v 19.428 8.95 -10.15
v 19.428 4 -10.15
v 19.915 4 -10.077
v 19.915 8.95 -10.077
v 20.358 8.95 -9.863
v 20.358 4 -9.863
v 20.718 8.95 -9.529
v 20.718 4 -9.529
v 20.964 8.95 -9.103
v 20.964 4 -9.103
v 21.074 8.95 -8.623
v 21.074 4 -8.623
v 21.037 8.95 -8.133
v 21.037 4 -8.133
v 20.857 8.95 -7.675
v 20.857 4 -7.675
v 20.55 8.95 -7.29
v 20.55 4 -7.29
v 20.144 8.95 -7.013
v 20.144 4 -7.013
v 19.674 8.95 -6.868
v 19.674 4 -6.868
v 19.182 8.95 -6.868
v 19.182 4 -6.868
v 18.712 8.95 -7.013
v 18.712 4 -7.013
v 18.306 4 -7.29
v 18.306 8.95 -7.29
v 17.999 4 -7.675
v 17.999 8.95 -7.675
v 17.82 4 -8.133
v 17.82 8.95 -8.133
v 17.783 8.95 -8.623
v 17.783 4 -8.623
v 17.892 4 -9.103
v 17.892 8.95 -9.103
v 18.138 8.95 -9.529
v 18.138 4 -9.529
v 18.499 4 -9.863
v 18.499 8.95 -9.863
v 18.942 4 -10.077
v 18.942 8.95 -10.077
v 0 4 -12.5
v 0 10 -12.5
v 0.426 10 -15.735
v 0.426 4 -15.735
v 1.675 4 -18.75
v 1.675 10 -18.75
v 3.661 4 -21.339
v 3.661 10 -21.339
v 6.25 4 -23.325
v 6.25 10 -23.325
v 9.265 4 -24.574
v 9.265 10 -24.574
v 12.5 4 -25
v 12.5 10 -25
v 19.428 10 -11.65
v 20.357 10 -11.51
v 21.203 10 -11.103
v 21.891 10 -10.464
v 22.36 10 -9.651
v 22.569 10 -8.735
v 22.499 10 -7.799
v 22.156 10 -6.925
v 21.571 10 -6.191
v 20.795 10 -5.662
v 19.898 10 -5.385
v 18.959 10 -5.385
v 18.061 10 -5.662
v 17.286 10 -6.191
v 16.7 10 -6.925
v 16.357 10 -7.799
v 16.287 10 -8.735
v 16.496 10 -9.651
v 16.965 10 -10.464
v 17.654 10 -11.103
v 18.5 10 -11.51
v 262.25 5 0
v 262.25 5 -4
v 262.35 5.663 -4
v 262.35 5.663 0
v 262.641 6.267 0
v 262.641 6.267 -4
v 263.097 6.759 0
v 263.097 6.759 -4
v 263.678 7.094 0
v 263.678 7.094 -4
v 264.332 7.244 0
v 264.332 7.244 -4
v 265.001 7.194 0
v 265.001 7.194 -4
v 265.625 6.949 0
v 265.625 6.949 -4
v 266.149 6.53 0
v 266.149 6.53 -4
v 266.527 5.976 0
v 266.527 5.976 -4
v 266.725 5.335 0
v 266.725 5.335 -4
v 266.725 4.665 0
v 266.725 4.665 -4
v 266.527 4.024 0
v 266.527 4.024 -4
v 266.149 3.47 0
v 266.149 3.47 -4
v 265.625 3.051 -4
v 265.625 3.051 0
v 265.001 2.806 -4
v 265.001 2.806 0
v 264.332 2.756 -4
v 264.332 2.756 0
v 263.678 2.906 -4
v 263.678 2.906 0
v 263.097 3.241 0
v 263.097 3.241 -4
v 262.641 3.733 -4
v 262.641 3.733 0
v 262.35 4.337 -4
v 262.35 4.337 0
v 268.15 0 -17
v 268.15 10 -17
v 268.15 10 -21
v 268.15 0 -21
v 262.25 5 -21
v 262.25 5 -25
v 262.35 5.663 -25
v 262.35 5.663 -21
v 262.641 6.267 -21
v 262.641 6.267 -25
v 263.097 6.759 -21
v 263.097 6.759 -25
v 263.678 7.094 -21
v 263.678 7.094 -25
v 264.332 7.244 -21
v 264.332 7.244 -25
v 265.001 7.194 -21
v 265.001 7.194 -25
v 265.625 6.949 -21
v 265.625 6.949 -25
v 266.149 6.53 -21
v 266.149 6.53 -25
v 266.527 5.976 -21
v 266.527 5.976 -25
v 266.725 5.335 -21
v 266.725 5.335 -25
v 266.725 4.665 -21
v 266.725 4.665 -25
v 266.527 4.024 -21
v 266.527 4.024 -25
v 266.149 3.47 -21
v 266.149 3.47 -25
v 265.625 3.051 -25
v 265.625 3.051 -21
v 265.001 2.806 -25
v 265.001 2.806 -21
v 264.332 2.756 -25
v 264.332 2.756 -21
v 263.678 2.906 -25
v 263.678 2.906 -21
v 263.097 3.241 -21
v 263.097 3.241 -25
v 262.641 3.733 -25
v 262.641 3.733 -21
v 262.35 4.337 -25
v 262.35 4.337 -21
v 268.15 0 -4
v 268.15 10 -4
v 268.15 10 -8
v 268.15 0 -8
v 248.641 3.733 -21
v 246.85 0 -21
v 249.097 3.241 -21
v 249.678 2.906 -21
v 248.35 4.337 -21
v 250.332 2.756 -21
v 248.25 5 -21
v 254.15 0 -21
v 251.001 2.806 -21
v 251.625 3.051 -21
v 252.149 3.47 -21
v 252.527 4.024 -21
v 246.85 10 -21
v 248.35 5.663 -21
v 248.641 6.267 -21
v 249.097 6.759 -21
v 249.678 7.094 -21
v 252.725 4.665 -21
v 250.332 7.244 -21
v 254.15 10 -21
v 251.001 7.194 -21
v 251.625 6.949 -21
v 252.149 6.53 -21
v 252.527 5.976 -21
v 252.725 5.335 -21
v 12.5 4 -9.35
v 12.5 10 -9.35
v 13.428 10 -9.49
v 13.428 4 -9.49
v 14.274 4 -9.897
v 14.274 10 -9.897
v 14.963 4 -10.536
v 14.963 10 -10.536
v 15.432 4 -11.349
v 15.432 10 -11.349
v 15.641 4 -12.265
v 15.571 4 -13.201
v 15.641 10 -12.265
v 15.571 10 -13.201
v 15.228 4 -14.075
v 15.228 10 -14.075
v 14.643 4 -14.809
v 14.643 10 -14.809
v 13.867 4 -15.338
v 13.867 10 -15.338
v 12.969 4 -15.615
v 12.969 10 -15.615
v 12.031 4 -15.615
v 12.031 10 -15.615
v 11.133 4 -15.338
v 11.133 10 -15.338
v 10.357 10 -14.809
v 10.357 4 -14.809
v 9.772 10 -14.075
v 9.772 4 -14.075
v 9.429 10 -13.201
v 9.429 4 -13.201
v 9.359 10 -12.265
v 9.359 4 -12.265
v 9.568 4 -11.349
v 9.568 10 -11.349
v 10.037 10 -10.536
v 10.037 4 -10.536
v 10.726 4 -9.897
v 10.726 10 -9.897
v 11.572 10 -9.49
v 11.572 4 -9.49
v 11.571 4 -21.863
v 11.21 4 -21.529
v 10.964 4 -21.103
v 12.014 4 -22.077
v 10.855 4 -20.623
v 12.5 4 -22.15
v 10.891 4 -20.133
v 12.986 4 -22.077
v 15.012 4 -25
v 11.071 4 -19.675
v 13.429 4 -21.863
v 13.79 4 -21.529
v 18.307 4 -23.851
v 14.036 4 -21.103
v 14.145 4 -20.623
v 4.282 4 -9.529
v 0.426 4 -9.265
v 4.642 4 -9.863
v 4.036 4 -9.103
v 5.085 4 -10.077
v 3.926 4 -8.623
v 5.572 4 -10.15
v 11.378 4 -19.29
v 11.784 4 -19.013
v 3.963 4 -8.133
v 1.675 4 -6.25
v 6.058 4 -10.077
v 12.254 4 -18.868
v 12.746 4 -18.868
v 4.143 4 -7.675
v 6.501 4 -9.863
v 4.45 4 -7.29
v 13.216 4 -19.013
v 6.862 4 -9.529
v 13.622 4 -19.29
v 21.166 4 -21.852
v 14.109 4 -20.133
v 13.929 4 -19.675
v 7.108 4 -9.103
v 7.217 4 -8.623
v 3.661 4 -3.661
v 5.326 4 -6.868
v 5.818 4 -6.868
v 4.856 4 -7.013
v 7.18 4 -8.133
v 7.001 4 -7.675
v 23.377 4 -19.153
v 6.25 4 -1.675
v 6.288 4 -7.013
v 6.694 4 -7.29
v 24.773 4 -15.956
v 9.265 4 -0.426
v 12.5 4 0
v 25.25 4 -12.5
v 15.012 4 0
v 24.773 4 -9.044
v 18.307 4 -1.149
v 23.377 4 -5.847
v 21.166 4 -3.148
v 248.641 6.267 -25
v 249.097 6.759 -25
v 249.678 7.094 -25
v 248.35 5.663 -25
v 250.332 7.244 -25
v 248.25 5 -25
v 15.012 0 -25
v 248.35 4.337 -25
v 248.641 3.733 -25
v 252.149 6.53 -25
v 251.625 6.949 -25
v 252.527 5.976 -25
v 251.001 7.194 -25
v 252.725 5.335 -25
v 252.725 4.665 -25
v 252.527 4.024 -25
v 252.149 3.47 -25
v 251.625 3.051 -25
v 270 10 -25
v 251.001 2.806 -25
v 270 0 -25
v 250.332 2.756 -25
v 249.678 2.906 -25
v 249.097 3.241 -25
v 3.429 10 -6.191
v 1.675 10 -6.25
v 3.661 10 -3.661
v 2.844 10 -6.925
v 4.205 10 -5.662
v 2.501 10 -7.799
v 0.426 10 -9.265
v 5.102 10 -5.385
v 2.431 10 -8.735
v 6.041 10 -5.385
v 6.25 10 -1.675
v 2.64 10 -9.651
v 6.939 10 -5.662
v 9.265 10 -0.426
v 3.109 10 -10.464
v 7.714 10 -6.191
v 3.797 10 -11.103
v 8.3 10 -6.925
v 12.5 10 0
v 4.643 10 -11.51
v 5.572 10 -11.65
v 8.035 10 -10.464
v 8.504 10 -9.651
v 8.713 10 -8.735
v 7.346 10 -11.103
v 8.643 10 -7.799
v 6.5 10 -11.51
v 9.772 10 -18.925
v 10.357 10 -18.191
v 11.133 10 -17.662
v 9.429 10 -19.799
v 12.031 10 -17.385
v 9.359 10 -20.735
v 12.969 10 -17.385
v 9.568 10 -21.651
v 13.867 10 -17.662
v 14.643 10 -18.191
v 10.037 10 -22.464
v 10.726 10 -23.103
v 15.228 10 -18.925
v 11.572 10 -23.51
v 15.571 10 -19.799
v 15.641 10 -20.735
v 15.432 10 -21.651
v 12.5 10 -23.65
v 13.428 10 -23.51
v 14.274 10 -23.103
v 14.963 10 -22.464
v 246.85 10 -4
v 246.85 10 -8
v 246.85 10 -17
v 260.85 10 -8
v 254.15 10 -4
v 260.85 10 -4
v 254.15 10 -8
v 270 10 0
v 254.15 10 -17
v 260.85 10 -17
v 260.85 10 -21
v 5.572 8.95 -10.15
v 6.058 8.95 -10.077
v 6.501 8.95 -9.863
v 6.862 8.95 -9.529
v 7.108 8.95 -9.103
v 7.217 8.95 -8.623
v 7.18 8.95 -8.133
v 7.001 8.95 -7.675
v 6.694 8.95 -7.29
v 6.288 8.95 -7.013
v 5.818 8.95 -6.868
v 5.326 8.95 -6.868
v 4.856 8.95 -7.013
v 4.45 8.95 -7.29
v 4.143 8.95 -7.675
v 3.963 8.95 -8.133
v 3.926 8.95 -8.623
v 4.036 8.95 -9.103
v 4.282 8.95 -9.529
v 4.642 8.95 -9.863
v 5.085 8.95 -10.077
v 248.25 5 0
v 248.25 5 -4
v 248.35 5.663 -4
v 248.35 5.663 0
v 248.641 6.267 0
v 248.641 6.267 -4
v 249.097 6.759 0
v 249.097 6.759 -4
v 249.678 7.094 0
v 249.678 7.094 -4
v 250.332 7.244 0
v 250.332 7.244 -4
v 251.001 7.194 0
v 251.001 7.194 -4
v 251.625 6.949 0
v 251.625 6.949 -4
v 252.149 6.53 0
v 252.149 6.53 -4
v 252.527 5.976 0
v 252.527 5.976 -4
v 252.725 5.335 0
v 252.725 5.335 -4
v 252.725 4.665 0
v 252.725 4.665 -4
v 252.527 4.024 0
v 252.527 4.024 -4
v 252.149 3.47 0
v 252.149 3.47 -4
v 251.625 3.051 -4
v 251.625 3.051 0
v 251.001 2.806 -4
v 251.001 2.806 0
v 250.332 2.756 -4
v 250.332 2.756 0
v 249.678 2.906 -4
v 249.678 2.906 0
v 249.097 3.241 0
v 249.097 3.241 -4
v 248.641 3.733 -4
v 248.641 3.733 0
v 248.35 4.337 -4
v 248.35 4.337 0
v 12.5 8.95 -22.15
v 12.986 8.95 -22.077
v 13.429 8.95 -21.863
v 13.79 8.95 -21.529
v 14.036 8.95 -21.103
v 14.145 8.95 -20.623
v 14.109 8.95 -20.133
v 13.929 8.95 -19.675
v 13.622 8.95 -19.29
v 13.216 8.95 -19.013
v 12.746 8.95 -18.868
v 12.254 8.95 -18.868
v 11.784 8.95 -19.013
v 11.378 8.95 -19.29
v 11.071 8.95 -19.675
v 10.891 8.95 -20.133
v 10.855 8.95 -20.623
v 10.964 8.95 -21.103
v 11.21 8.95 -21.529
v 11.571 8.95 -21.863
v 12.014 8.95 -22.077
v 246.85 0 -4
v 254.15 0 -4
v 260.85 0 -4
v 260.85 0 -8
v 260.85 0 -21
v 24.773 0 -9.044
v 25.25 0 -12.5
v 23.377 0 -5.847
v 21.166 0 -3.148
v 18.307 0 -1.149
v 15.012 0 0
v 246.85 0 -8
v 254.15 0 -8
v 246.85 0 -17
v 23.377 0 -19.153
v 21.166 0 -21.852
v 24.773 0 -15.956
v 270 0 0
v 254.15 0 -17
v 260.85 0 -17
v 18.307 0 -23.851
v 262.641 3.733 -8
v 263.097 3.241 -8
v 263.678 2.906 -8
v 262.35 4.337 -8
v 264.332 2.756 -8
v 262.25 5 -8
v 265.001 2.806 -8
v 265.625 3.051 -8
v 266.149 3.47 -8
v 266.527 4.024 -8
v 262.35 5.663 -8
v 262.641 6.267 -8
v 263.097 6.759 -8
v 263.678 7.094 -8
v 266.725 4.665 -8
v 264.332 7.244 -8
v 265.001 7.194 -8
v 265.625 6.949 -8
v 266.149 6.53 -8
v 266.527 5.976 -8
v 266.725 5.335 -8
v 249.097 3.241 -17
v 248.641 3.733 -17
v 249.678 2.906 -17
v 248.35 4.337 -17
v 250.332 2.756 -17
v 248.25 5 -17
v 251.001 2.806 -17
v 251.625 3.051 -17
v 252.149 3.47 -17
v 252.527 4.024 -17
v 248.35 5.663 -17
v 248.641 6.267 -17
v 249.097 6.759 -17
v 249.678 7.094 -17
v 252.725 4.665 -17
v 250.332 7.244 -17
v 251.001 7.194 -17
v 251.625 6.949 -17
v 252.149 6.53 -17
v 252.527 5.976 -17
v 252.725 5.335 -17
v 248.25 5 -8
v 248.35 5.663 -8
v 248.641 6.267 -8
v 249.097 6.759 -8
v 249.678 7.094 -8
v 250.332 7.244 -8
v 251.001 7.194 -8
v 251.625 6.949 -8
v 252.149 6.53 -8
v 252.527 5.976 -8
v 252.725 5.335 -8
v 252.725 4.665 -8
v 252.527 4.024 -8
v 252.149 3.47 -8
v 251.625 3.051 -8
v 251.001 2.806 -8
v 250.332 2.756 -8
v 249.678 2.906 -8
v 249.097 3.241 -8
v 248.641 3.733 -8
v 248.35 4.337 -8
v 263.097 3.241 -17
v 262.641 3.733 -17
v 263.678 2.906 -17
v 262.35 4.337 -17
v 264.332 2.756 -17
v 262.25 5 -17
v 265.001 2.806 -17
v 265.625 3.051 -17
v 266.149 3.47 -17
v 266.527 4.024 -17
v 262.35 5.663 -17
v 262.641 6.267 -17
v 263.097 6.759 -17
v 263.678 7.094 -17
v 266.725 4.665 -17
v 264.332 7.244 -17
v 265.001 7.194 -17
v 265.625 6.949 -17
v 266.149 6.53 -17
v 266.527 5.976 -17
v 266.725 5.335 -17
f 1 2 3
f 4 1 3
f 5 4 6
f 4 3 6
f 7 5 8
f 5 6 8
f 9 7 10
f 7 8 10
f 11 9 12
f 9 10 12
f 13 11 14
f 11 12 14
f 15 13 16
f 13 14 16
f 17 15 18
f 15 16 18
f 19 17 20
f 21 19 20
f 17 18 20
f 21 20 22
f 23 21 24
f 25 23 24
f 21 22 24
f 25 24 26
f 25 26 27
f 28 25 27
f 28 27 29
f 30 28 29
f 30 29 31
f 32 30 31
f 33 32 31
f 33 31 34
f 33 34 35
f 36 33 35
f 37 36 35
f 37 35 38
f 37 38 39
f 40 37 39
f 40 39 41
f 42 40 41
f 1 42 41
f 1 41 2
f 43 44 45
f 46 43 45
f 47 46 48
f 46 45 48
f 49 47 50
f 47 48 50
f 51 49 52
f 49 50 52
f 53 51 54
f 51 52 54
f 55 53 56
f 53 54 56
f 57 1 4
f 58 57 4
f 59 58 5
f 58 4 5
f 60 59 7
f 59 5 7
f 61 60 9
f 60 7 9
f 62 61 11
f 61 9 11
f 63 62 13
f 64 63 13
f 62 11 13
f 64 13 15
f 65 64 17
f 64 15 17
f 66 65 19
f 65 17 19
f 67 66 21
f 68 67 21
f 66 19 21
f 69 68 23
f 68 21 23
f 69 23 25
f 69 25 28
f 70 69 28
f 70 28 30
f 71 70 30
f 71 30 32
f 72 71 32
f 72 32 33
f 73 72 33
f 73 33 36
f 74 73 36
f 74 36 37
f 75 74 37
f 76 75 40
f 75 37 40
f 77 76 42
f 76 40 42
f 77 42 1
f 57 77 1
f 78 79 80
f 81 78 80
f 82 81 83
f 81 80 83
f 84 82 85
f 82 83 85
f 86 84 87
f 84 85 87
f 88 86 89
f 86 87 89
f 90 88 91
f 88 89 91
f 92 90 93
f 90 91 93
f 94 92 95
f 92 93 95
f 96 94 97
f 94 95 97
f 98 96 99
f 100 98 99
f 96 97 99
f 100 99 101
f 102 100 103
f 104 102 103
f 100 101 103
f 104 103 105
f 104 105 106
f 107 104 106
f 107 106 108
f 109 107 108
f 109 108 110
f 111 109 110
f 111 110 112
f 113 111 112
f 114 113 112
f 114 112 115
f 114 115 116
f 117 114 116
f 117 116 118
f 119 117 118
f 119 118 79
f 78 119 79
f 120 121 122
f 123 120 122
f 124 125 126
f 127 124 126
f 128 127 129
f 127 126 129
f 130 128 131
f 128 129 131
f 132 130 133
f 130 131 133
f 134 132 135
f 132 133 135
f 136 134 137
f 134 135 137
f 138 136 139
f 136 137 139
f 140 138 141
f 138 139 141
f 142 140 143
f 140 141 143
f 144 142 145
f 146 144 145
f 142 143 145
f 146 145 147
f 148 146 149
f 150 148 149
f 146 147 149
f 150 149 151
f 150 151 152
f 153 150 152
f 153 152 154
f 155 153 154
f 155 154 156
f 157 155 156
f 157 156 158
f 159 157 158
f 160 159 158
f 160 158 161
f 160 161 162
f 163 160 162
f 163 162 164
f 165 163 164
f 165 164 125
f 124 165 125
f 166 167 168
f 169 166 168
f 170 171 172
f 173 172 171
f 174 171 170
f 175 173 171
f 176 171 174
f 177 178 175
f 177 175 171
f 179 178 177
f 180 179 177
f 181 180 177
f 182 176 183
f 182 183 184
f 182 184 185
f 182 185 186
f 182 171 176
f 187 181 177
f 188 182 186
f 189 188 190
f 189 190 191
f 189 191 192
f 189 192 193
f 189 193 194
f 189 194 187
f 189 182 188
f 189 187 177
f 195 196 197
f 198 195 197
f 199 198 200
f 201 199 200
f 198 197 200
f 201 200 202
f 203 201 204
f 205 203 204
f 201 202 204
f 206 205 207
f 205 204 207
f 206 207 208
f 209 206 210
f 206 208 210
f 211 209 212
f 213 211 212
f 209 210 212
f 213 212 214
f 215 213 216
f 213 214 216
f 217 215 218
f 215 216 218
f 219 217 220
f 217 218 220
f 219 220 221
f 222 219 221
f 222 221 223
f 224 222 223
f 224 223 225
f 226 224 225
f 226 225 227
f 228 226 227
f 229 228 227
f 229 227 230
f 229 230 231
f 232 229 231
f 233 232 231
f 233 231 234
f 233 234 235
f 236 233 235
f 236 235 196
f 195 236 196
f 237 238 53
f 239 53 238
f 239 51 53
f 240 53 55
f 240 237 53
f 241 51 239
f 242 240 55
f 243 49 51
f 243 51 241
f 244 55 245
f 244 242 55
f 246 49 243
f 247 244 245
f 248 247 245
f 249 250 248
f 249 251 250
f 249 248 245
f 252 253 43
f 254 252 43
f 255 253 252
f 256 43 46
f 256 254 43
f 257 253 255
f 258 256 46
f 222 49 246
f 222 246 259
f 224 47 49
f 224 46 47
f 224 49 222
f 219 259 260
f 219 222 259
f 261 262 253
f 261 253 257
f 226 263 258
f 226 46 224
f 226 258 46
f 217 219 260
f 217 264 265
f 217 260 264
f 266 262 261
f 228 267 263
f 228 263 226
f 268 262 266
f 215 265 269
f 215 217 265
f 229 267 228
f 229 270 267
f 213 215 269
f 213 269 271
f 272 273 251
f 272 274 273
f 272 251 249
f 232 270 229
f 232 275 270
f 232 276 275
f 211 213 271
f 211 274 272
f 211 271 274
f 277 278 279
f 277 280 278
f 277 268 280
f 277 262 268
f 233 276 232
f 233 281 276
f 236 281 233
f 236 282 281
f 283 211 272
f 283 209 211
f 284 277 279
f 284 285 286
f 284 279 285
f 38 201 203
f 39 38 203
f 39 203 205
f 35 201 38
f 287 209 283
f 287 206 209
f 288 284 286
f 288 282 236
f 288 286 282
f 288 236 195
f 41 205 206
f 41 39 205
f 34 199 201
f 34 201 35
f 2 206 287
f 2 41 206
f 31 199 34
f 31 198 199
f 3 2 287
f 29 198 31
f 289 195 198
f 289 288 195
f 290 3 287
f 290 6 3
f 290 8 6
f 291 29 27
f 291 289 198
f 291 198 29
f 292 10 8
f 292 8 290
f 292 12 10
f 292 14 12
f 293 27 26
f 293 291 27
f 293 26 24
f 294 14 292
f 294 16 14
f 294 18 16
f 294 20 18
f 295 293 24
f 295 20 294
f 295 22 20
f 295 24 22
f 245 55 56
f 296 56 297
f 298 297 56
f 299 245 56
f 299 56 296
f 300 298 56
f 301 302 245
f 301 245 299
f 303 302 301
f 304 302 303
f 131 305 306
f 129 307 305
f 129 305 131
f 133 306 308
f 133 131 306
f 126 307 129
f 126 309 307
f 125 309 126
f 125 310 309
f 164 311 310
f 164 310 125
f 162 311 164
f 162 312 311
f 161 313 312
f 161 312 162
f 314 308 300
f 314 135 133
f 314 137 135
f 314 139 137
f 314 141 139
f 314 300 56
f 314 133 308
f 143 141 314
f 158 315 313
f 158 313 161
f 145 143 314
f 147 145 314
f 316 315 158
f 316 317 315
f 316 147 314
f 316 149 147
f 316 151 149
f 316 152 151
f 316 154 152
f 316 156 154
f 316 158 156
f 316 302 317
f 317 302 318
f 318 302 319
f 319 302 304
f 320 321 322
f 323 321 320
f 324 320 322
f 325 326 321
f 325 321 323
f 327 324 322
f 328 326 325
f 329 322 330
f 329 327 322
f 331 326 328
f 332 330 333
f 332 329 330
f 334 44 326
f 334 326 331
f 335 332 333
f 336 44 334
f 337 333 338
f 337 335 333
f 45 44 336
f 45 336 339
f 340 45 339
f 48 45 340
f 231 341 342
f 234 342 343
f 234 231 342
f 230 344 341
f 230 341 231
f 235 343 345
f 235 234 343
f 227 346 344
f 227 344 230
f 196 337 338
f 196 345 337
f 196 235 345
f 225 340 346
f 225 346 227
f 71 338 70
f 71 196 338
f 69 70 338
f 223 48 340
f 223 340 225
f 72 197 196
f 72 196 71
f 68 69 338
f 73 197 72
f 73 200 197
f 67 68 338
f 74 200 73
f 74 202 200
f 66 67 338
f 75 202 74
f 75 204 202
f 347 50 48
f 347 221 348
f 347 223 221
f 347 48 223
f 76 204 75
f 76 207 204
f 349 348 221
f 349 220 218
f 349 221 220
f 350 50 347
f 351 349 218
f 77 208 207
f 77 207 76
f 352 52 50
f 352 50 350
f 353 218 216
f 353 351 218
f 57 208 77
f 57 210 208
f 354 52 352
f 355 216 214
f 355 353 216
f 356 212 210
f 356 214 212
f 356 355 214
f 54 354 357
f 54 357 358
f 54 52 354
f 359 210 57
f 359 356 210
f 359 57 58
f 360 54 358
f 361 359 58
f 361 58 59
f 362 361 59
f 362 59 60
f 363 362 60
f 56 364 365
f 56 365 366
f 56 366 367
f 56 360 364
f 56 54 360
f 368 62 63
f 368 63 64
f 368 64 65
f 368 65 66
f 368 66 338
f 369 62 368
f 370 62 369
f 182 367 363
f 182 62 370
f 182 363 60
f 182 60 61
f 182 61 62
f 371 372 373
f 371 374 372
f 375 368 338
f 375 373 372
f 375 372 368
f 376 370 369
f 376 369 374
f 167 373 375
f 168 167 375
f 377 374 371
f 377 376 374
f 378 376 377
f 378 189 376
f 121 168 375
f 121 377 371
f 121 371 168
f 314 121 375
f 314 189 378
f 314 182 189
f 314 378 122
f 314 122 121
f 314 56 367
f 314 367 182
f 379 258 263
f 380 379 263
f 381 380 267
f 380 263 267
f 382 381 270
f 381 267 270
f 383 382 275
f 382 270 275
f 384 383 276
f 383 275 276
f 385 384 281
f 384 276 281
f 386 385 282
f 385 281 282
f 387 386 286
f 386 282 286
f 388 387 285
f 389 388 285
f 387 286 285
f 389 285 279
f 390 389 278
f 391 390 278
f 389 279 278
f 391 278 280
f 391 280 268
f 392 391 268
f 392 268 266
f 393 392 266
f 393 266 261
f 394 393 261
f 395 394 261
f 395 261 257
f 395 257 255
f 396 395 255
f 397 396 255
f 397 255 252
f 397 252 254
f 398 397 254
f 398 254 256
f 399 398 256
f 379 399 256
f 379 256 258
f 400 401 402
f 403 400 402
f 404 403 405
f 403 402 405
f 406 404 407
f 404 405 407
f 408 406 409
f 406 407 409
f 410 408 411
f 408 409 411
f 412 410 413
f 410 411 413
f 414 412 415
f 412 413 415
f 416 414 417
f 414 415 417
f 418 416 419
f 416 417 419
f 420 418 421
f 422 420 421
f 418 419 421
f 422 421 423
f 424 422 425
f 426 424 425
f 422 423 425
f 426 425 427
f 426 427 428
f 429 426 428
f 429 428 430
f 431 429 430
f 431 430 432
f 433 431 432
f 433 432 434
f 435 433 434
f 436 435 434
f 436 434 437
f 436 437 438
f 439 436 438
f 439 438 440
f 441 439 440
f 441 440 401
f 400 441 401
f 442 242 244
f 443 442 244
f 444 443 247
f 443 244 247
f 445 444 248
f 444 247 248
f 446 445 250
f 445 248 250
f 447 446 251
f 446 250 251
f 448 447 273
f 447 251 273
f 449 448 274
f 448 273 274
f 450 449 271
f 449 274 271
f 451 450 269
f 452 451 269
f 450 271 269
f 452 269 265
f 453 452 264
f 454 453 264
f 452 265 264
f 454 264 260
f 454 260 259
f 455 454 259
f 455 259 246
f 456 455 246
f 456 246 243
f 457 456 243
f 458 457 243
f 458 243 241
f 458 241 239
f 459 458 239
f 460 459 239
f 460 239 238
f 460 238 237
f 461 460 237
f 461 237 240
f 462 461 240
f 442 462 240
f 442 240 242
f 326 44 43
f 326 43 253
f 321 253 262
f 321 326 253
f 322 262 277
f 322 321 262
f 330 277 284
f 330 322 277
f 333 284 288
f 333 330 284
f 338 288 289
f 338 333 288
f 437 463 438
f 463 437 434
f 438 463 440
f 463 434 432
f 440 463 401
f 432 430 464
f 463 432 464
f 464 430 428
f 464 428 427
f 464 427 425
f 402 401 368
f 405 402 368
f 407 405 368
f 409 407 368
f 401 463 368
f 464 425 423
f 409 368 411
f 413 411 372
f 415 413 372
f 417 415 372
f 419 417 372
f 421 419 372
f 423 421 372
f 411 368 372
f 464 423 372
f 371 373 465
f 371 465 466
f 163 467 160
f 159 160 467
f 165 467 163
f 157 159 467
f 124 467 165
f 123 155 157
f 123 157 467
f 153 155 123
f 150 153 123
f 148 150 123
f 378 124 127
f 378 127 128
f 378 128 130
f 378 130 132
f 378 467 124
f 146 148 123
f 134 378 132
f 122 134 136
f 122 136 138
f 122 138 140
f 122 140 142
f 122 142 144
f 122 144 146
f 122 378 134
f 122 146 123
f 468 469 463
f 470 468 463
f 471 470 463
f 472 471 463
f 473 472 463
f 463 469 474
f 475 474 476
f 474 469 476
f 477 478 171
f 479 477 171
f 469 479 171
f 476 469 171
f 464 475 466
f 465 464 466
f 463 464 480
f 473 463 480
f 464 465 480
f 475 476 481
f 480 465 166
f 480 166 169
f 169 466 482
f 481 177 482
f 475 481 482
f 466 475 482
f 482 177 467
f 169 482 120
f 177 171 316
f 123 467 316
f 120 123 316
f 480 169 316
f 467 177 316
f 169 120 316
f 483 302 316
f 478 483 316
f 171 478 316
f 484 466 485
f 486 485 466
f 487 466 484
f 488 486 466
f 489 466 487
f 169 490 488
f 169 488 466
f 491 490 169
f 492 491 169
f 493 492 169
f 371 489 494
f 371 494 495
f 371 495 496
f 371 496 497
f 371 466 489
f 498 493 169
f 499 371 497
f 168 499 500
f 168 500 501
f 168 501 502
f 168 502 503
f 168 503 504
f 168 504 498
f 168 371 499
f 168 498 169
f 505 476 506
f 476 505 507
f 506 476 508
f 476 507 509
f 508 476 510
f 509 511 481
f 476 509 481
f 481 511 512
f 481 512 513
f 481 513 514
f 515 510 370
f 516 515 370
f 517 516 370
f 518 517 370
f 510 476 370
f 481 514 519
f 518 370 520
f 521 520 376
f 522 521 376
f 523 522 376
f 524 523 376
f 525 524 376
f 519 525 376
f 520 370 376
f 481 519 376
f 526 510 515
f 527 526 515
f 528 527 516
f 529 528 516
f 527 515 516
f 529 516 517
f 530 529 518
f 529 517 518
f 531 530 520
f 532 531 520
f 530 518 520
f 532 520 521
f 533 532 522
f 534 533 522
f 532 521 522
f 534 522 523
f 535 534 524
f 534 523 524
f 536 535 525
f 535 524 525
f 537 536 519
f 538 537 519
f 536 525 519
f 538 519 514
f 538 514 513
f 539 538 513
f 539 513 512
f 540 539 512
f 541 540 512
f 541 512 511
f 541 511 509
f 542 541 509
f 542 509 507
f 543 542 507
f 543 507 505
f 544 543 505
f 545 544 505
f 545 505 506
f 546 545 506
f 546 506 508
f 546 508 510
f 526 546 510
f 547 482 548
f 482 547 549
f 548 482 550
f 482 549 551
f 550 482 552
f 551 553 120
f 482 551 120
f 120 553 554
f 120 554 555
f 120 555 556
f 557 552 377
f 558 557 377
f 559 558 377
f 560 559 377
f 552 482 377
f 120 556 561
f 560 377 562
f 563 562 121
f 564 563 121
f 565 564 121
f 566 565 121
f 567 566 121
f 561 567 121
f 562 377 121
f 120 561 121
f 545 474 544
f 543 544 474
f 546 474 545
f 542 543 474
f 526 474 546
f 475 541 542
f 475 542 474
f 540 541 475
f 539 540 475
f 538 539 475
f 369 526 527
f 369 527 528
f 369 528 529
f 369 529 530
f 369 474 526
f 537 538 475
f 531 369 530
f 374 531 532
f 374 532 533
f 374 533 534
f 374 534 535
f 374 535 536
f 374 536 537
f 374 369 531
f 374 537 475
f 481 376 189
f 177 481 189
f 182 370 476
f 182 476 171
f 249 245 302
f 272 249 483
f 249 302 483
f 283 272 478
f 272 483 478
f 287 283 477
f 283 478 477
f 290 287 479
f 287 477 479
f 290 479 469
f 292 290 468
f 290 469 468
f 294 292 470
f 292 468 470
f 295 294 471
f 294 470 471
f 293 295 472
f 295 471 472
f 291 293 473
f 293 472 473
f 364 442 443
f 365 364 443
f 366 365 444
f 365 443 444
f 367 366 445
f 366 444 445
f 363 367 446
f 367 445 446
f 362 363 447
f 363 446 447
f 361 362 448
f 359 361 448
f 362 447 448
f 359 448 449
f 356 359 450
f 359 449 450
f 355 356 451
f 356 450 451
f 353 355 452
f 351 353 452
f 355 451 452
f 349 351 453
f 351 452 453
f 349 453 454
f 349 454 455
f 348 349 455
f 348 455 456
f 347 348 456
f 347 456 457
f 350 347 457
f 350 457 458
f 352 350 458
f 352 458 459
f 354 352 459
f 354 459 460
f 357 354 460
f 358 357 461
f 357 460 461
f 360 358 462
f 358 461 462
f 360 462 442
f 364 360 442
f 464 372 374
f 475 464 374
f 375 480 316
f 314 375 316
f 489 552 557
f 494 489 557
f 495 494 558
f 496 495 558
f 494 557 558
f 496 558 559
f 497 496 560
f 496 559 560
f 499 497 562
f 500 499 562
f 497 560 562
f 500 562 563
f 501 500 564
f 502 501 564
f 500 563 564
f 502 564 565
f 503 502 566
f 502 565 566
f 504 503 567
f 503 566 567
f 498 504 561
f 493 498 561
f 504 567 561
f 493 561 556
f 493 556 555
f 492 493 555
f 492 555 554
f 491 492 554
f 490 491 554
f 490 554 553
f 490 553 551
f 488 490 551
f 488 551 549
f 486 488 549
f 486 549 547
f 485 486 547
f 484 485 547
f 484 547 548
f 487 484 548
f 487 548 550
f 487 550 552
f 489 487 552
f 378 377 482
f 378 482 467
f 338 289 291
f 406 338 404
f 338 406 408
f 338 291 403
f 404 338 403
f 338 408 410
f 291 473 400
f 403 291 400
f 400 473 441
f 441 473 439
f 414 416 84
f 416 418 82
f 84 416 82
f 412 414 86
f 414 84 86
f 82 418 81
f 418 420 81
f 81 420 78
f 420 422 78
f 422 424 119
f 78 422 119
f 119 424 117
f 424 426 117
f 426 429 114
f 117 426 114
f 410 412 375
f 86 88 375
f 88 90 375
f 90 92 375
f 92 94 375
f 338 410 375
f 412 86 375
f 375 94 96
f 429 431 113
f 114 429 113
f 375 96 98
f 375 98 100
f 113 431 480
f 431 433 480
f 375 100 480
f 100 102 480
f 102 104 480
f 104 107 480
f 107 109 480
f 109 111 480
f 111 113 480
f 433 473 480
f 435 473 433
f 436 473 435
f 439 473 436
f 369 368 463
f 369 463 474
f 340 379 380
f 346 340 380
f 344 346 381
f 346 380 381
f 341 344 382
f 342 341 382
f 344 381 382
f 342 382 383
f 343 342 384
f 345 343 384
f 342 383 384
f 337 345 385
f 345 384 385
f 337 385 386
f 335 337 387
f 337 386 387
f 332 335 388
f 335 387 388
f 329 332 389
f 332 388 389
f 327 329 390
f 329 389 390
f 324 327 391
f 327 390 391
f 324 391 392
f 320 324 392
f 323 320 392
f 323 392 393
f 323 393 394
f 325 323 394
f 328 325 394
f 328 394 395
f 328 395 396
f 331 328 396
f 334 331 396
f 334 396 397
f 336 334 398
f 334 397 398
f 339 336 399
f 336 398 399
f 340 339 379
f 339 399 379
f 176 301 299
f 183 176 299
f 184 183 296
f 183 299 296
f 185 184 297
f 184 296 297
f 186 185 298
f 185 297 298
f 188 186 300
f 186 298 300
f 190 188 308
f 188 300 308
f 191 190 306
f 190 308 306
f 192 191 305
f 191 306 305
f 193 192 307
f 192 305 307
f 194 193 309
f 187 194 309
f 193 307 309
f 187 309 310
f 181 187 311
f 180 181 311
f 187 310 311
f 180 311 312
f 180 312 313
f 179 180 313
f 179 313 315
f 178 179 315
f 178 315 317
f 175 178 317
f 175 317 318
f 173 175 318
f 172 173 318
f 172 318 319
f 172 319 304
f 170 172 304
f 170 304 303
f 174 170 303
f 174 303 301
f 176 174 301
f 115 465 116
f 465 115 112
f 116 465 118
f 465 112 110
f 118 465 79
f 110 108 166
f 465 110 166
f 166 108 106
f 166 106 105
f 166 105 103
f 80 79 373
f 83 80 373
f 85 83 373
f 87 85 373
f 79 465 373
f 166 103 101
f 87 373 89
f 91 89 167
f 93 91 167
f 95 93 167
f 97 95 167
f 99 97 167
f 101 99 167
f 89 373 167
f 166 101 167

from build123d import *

# Parameters (mm, degrees)
SKETCH1_W           = 270
SKETCH1_H           = 25
BOSS_EXTRUDE1_DEPTH = 10
CUT_EXTRUDE1_REACH  = 273.339
SKETCH2_R           = 3.15
FILLET1_R           = 12.5
SKETCH3_R           = 2.25
CUT_EXTRUDE2_DEPTH  = 272.339271024
CUT_EXTRUDE5_REACH  = 273.339
SKETCH5_W           = 7.3
SKETCH5_H           = 4
SKETCH6_R           = 12.75
CUT_EXTRUDE6_DEPTH  = 4
CUT_EXTRUDE7_REACH  = 273.221
SKETCH7_R           = 1.65
CHAMFER1_SIZE       = 1.5
CHAMFER1_SIZE2      = 1.050311307


with BuildPart() as part:
    # Sketch1 → Boss-Extrude1 (new body)
    with BuildSketch(Plane(origin=(0, 0, 0), x_dir=(1, 0, 0), z_dir=(0, 1, 0))):
        with Locations((135, 12.5)):
            Rectangle(SKETCH1_W, SKETCH1_H)
    extrude(amount=BOSS_EXTRUDE1_DEPTH)

    # Sketch2 → Cut-Extrude1 (cut, up to next)
    with BuildSketch(Plane(origin=(0, 10, 0), x_dir=(1, 0, 0), z_dir=(0, 1, 0)), mode=Mode.PRIVATE) as cut_extrude1_sk1:
        with Locations(Location((12.5, 12.5, 0), (0, 0, 270))):
            Circle(SKETCH2_R)
    cut_extrude1_tool1 = extrude(cut_extrude1_sk1.sketch, amount=-CUT_EXTRUDE1_REACH, mode=Mode.PRIVATE) & part.part
    add(cut_extrude1_tool1.solids().sort_by_distance((12.5, 10, -12.5))[0], mode=Mode.SUBTRACT)

    # Fillet1
    fillet1_edges = [part.edges().sort_by_distance(p)[0] for p in [
        (0, 5, 0),
        (0, 5, -25),
    ]]
    fillet(fillet1_edges, radius=FILLET1_R - 0.0001)  # a hair under: the kernel refuses the full size

    # Sketch3 → Cut-Extrude2 (cut, through all)
    with BuildSketch(Plane(origin=(0, 0, -25), x_dir=(-1, 0, 0), z_dir=(0, 0, -1))):
        with Locations((-264.5, 5)):
            Circle(SKETCH3_R)
        with Locations((-250.5, 5)):
            Circle(SKETCH3_R)
    extrude(amount=-CUT_EXTRUDE2_DEPTH, mode=Mode.SUBTRACT)

    # Sketch5 → Cut-Extrude5 (cut, up to next)
    with BuildSketch(Plane(origin=(0, 10, 0), x_dir=(1, 0, 0), z_dir=(0, 1, 0)), mode=Mode.PRIVATE) as cut_extrude5_sk1:
        with Locations((264.5, 19)):
            Rectangle(SKETCH5_W, SKETCH5_H)
    cut_extrude5_tool1 = extrude(cut_extrude5_sk1.sketch, amount=-CUT_EXTRUDE5_REACH, mode=Mode.PRIVATE) & part.part
    # Sketch5 → Cut-Extrude5 (cut, up to next)
    with BuildSketch(Plane(origin=(0, 10, 0), x_dir=(1, 0, 0), z_dir=(0, 1, 0)), mode=Mode.PRIVATE) as cut_extrude5_sk2:
        with Locations((264.5, 6)):
            Rectangle(SKETCH5_W, SKETCH5_H)
    cut_extrude5_tool2 = extrude(cut_extrude5_sk2.sketch, amount=-CUT_EXTRUDE5_REACH, mode=Mode.PRIVATE) & part.part
    # Sketch5 → Cut-Extrude5 (cut, up to next)
    with BuildSketch(Plane(origin=(0, 10, 0), x_dir=(1, 0, 0), z_dir=(0, 1, 0)), mode=Mode.PRIVATE) as cut_extrude5_sk3:
        with Locations((250.5, 19)):
            Rectangle(SKETCH5_W, SKETCH5_H)
    cut_extrude5_tool3 = extrude(cut_extrude5_sk3.sketch, amount=-CUT_EXTRUDE5_REACH, mode=Mode.PRIVATE) & part.part
    # Sketch5 → Cut-Extrude5 (cut, up to next)
    with BuildSketch(Plane(origin=(0, 10, 0), x_dir=(1, 0, 0), z_dir=(0, 1, 0)), mode=Mode.PRIVATE) as cut_extrude5_sk4:
        with Locations((250.5, 6)):
            Rectangle(SKETCH5_W, SKETCH5_H)
    cut_extrude5_tool4 = extrude(cut_extrude5_sk4.sketch, amount=-CUT_EXTRUDE5_REACH, mode=Mode.PRIVATE) & part.part
    add(cut_extrude5_tool1.solids().sort_by_distance((264.5, 10, -19))[0], mode=Mode.SUBTRACT)
    add(cut_extrude5_tool2.solids().sort_by_distance((264.5, 10, -6))[0], mode=Mode.SUBTRACT)
    add(cut_extrude5_tool3.solids().sort_by_distance((250.5, 10, -19))[0], mode=Mode.SUBTRACT)
    add(cut_extrude5_tool4.solids().sort_by_distance((250.5, 10, -6))[0], mode=Mode.SUBTRACT)

    # Sketch6 → Cut-Extrude6 (cut)
    with BuildSketch(Plane.XZ):
        with Locations((12.5, -12.5)):
            Circle(SKETCH6_R)
    extrude(amount=-CUT_EXTRUDE6_DEPTH, mode=Mode.SUBTRACT)

    # Sketch7 → Cut-Extrude7 (cut, up to next)
    with BuildSketch(Plane.XZ.offset(-4), mode=Mode.PRIVATE) as cut_extrude7_sk1:
        with Locations(Location((12.5, -20.5, 0), (0, 0, 270))):
            Circle(SKETCH7_R)
    cut_extrude7_tool1 = extrude(cut_extrude7_sk1.sketch, amount=-CUT_EXTRUDE7_REACH, mode=Mode.PRIVATE) & part.part
    # Sketch7 → Cut-Extrude7 (cut, up to next)
    with BuildSketch(Plane.XZ.offset(-4), mode=Mode.PRIVATE) as cut_extrude7_sk2:
        with Locations(Location((5.57179677, -8.5, 0), (0, 0, 270))):
            Circle(SKETCH7_R)
    cut_extrude7_tool2 = extrude(cut_extrude7_sk2.sketch, amount=-CUT_EXTRUDE7_REACH, mode=Mode.PRIVATE) & part.part
    # Sketch7 → Cut-Extrude7 (cut, up to next)
    with BuildSketch(Plane.XZ.offset(-4), mode=Mode.PRIVATE) as cut_extrude7_sk3:
        with Locations(Location((19.42820323, -8.5, 0), (0, 0, 270))):
            Circle(SKETCH7_R)
    cut_extrude7_tool3 = extrude(cut_extrude7_sk3.sketch, amount=-CUT_EXTRUDE7_REACH, mode=Mode.PRIVATE) & part.part
    add(cut_extrude7_tool1.solids().sort_by_distance((12.5, 4, -20.5))[0], mode=Mode.SUBTRACT)
    add(cut_extrude7_tool2.solids().sort_by_distance((5.571797, 4, -8.5))[0], mode=Mode.SUBTRACT)
    add(cut_extrude7_tool3.solids().sort_by_distance((19.428203, 4, -8.5))[0], mode=Mode.SUBTRACT)

    # Chamfer1
    chamfer1_edges = [part.edges().sort_by_distance(p)[0] for p in [
        (12.5, 10, -18.85),
        (5.57179677, 10, -6.85),
        (19.42820323, 10, -6.85),
    ]]
    chamfer1_side = [part.faces().sort_by_distance(p)[0] for p in [
        (135.233508086, 10, -12.5),
    ]]
    chamfer(chamfer1_edges, length=CHAMFER1_SIZE, length2=CHAMFER1_SIZE2, reference=chamfer1_side[0])


solid = part.part
